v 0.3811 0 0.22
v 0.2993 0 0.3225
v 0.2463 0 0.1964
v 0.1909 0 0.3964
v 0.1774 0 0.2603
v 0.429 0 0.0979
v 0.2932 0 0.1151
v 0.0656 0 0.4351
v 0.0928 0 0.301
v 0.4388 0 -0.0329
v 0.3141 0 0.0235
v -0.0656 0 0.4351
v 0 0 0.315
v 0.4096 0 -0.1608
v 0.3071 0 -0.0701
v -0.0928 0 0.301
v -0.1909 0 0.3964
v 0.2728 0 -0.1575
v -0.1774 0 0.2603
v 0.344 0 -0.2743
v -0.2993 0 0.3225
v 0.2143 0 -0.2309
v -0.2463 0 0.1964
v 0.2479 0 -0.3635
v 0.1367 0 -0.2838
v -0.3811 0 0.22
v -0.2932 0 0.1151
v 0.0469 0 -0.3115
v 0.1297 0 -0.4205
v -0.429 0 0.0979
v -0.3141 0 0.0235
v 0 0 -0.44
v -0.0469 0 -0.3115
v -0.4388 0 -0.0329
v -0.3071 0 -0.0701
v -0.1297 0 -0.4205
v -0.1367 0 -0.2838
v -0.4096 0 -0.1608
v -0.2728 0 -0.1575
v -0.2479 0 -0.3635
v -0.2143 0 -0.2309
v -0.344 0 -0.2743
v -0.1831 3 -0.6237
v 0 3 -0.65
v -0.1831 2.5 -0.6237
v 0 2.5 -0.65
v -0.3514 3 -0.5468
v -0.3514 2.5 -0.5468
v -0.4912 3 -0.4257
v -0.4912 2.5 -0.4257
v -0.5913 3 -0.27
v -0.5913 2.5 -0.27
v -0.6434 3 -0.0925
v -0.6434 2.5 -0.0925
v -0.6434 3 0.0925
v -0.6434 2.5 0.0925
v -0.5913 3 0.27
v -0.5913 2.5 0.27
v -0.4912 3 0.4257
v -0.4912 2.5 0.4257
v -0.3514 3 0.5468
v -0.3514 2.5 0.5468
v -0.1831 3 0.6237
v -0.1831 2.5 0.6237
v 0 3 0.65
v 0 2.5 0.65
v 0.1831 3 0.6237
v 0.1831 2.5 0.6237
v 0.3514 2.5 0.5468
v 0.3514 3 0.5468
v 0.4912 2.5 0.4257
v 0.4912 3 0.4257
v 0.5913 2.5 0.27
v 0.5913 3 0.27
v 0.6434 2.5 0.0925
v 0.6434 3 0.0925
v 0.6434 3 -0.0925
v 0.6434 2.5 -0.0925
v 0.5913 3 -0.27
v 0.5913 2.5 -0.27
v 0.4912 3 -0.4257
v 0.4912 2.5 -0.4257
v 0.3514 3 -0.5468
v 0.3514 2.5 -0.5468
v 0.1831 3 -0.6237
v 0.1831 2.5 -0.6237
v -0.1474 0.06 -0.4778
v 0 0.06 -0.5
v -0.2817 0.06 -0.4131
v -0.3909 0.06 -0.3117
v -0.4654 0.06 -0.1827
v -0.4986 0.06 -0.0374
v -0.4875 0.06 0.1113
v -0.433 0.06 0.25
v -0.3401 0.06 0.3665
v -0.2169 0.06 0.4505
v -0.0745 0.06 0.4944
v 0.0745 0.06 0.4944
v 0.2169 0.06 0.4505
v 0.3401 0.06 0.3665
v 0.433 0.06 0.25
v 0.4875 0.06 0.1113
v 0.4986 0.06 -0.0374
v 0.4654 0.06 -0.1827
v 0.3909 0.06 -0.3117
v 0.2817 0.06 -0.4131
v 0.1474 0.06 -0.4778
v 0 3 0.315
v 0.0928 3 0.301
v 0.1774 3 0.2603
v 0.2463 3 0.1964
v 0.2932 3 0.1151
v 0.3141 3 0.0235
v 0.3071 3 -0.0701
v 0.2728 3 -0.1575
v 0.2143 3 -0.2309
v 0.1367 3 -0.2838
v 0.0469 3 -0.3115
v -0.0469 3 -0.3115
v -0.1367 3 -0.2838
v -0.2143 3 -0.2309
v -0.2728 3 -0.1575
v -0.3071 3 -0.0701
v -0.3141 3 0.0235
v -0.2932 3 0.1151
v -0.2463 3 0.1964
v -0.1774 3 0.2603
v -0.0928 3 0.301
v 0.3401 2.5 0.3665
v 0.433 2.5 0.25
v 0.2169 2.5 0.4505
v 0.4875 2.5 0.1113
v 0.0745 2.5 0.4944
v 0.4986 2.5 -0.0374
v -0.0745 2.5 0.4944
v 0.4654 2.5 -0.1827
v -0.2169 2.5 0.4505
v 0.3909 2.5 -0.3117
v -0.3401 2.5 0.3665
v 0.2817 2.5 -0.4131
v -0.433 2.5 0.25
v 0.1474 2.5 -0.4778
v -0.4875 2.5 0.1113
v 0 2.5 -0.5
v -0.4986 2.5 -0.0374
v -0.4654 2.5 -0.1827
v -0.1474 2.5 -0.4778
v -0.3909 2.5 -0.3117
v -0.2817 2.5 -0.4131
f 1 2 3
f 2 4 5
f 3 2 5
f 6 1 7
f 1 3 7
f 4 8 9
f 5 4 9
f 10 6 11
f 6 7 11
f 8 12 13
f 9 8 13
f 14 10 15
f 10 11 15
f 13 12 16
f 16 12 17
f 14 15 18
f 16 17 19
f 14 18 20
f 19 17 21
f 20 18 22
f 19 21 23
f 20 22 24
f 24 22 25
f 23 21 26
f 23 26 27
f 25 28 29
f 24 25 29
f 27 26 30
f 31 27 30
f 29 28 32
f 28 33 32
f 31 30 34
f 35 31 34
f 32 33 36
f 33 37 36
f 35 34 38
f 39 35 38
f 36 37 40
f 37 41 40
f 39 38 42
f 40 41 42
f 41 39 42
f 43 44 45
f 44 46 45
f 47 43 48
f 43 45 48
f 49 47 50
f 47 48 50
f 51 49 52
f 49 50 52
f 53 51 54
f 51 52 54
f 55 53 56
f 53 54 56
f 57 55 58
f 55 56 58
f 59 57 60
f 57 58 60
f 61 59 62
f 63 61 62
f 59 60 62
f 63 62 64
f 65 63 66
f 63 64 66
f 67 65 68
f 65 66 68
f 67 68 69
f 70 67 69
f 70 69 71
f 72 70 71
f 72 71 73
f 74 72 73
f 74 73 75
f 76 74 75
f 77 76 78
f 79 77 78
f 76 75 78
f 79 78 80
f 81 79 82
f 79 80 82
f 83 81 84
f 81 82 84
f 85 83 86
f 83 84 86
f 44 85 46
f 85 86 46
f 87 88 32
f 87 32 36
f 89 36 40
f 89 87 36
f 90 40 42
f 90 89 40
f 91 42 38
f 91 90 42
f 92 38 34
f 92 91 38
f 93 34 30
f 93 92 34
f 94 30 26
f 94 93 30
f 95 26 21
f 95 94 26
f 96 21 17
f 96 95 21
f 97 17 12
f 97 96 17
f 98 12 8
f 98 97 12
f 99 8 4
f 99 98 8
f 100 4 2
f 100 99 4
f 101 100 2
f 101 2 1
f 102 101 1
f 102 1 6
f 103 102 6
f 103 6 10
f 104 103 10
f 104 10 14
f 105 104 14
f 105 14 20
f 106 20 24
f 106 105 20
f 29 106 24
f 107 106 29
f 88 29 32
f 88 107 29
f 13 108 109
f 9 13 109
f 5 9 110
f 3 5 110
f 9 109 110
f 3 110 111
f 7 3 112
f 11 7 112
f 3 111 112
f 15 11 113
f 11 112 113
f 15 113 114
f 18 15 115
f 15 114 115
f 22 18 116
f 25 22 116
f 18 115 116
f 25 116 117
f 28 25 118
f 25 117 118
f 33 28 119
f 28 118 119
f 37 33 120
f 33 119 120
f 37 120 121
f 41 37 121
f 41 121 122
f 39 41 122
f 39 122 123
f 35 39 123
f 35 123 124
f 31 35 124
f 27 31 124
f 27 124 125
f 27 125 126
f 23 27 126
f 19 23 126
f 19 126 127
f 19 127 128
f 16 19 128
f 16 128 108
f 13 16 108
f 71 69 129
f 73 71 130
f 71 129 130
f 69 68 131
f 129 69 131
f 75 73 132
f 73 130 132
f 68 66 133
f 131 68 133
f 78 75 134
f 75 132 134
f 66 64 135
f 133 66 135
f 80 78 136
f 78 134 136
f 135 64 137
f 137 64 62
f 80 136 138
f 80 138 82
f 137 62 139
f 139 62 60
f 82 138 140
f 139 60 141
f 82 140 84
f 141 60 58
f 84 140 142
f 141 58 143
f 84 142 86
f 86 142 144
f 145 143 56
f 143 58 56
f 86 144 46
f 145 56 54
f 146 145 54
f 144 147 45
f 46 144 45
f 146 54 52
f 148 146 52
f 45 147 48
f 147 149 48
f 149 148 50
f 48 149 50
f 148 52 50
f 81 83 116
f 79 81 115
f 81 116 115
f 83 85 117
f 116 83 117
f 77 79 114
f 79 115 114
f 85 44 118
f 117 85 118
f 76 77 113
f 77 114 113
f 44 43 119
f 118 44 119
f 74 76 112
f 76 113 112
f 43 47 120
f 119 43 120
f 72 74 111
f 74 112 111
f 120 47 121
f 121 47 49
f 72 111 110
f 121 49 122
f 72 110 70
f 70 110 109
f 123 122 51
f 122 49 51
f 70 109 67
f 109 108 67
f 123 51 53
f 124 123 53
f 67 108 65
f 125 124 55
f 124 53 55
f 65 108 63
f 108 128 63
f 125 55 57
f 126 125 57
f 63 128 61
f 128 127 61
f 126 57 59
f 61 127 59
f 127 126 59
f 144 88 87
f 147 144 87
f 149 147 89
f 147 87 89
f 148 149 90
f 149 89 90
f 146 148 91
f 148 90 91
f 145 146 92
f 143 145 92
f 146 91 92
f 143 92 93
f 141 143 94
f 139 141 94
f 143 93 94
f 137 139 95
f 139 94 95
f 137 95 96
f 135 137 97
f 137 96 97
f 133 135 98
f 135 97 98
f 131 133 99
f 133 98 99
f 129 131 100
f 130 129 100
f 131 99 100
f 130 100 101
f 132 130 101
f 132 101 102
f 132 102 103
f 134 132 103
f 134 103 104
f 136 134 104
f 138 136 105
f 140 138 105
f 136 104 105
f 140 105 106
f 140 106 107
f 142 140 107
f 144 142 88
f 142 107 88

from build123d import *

# Parameters (mm, degrees)
SKETCH2_R          = 0.315
CUT_EXTRUDE1_DEPTH = 4.137674298
CHAMFER1_SIZE      = 0.06


with BuildPart() as part:
    # Sketch1 → Revolve1 (revolve)
    with BuildSketch(Plane.XY, mode=Mode.PRIVATE) as revolve1_sk:
        Polygon((0, 0), (0, 3), (0.65, 3), (0.65, 2.5), (0.5, 2.5), (0.5, 0), align=None)
    revolve(revolve1_sk.sketch.rotate(Axis((0, 0, 0), (0, 1, 0)), 90), axis=Axis((0, 0, 0), (0, 1, 0)))

    # Sketch2 → Cut-Extrude1 (cut, through all)
    with BuildSketch(Plane(origin=(0, 3, 0), x_dir=(1, 0, 0), z_dir=(0, 1, 0))):
        with Locations(Location((0, 0, 0), (0, 0, 270))):
            Circle(SKETCH2_R)
    extrude(amount=-CUT_EXTRUDE1_DEPTH, mode=Mode.SUBTRACT)

    # Chamfer1
    chamfer1_edges = [part.edges().sort_by_distance(p)[0] for p in [
        (0, 0, 0.5),
    ]]
    chamfer(chamfer1_edges, length=CHAMFER1_SIZE)


solid = part.part
